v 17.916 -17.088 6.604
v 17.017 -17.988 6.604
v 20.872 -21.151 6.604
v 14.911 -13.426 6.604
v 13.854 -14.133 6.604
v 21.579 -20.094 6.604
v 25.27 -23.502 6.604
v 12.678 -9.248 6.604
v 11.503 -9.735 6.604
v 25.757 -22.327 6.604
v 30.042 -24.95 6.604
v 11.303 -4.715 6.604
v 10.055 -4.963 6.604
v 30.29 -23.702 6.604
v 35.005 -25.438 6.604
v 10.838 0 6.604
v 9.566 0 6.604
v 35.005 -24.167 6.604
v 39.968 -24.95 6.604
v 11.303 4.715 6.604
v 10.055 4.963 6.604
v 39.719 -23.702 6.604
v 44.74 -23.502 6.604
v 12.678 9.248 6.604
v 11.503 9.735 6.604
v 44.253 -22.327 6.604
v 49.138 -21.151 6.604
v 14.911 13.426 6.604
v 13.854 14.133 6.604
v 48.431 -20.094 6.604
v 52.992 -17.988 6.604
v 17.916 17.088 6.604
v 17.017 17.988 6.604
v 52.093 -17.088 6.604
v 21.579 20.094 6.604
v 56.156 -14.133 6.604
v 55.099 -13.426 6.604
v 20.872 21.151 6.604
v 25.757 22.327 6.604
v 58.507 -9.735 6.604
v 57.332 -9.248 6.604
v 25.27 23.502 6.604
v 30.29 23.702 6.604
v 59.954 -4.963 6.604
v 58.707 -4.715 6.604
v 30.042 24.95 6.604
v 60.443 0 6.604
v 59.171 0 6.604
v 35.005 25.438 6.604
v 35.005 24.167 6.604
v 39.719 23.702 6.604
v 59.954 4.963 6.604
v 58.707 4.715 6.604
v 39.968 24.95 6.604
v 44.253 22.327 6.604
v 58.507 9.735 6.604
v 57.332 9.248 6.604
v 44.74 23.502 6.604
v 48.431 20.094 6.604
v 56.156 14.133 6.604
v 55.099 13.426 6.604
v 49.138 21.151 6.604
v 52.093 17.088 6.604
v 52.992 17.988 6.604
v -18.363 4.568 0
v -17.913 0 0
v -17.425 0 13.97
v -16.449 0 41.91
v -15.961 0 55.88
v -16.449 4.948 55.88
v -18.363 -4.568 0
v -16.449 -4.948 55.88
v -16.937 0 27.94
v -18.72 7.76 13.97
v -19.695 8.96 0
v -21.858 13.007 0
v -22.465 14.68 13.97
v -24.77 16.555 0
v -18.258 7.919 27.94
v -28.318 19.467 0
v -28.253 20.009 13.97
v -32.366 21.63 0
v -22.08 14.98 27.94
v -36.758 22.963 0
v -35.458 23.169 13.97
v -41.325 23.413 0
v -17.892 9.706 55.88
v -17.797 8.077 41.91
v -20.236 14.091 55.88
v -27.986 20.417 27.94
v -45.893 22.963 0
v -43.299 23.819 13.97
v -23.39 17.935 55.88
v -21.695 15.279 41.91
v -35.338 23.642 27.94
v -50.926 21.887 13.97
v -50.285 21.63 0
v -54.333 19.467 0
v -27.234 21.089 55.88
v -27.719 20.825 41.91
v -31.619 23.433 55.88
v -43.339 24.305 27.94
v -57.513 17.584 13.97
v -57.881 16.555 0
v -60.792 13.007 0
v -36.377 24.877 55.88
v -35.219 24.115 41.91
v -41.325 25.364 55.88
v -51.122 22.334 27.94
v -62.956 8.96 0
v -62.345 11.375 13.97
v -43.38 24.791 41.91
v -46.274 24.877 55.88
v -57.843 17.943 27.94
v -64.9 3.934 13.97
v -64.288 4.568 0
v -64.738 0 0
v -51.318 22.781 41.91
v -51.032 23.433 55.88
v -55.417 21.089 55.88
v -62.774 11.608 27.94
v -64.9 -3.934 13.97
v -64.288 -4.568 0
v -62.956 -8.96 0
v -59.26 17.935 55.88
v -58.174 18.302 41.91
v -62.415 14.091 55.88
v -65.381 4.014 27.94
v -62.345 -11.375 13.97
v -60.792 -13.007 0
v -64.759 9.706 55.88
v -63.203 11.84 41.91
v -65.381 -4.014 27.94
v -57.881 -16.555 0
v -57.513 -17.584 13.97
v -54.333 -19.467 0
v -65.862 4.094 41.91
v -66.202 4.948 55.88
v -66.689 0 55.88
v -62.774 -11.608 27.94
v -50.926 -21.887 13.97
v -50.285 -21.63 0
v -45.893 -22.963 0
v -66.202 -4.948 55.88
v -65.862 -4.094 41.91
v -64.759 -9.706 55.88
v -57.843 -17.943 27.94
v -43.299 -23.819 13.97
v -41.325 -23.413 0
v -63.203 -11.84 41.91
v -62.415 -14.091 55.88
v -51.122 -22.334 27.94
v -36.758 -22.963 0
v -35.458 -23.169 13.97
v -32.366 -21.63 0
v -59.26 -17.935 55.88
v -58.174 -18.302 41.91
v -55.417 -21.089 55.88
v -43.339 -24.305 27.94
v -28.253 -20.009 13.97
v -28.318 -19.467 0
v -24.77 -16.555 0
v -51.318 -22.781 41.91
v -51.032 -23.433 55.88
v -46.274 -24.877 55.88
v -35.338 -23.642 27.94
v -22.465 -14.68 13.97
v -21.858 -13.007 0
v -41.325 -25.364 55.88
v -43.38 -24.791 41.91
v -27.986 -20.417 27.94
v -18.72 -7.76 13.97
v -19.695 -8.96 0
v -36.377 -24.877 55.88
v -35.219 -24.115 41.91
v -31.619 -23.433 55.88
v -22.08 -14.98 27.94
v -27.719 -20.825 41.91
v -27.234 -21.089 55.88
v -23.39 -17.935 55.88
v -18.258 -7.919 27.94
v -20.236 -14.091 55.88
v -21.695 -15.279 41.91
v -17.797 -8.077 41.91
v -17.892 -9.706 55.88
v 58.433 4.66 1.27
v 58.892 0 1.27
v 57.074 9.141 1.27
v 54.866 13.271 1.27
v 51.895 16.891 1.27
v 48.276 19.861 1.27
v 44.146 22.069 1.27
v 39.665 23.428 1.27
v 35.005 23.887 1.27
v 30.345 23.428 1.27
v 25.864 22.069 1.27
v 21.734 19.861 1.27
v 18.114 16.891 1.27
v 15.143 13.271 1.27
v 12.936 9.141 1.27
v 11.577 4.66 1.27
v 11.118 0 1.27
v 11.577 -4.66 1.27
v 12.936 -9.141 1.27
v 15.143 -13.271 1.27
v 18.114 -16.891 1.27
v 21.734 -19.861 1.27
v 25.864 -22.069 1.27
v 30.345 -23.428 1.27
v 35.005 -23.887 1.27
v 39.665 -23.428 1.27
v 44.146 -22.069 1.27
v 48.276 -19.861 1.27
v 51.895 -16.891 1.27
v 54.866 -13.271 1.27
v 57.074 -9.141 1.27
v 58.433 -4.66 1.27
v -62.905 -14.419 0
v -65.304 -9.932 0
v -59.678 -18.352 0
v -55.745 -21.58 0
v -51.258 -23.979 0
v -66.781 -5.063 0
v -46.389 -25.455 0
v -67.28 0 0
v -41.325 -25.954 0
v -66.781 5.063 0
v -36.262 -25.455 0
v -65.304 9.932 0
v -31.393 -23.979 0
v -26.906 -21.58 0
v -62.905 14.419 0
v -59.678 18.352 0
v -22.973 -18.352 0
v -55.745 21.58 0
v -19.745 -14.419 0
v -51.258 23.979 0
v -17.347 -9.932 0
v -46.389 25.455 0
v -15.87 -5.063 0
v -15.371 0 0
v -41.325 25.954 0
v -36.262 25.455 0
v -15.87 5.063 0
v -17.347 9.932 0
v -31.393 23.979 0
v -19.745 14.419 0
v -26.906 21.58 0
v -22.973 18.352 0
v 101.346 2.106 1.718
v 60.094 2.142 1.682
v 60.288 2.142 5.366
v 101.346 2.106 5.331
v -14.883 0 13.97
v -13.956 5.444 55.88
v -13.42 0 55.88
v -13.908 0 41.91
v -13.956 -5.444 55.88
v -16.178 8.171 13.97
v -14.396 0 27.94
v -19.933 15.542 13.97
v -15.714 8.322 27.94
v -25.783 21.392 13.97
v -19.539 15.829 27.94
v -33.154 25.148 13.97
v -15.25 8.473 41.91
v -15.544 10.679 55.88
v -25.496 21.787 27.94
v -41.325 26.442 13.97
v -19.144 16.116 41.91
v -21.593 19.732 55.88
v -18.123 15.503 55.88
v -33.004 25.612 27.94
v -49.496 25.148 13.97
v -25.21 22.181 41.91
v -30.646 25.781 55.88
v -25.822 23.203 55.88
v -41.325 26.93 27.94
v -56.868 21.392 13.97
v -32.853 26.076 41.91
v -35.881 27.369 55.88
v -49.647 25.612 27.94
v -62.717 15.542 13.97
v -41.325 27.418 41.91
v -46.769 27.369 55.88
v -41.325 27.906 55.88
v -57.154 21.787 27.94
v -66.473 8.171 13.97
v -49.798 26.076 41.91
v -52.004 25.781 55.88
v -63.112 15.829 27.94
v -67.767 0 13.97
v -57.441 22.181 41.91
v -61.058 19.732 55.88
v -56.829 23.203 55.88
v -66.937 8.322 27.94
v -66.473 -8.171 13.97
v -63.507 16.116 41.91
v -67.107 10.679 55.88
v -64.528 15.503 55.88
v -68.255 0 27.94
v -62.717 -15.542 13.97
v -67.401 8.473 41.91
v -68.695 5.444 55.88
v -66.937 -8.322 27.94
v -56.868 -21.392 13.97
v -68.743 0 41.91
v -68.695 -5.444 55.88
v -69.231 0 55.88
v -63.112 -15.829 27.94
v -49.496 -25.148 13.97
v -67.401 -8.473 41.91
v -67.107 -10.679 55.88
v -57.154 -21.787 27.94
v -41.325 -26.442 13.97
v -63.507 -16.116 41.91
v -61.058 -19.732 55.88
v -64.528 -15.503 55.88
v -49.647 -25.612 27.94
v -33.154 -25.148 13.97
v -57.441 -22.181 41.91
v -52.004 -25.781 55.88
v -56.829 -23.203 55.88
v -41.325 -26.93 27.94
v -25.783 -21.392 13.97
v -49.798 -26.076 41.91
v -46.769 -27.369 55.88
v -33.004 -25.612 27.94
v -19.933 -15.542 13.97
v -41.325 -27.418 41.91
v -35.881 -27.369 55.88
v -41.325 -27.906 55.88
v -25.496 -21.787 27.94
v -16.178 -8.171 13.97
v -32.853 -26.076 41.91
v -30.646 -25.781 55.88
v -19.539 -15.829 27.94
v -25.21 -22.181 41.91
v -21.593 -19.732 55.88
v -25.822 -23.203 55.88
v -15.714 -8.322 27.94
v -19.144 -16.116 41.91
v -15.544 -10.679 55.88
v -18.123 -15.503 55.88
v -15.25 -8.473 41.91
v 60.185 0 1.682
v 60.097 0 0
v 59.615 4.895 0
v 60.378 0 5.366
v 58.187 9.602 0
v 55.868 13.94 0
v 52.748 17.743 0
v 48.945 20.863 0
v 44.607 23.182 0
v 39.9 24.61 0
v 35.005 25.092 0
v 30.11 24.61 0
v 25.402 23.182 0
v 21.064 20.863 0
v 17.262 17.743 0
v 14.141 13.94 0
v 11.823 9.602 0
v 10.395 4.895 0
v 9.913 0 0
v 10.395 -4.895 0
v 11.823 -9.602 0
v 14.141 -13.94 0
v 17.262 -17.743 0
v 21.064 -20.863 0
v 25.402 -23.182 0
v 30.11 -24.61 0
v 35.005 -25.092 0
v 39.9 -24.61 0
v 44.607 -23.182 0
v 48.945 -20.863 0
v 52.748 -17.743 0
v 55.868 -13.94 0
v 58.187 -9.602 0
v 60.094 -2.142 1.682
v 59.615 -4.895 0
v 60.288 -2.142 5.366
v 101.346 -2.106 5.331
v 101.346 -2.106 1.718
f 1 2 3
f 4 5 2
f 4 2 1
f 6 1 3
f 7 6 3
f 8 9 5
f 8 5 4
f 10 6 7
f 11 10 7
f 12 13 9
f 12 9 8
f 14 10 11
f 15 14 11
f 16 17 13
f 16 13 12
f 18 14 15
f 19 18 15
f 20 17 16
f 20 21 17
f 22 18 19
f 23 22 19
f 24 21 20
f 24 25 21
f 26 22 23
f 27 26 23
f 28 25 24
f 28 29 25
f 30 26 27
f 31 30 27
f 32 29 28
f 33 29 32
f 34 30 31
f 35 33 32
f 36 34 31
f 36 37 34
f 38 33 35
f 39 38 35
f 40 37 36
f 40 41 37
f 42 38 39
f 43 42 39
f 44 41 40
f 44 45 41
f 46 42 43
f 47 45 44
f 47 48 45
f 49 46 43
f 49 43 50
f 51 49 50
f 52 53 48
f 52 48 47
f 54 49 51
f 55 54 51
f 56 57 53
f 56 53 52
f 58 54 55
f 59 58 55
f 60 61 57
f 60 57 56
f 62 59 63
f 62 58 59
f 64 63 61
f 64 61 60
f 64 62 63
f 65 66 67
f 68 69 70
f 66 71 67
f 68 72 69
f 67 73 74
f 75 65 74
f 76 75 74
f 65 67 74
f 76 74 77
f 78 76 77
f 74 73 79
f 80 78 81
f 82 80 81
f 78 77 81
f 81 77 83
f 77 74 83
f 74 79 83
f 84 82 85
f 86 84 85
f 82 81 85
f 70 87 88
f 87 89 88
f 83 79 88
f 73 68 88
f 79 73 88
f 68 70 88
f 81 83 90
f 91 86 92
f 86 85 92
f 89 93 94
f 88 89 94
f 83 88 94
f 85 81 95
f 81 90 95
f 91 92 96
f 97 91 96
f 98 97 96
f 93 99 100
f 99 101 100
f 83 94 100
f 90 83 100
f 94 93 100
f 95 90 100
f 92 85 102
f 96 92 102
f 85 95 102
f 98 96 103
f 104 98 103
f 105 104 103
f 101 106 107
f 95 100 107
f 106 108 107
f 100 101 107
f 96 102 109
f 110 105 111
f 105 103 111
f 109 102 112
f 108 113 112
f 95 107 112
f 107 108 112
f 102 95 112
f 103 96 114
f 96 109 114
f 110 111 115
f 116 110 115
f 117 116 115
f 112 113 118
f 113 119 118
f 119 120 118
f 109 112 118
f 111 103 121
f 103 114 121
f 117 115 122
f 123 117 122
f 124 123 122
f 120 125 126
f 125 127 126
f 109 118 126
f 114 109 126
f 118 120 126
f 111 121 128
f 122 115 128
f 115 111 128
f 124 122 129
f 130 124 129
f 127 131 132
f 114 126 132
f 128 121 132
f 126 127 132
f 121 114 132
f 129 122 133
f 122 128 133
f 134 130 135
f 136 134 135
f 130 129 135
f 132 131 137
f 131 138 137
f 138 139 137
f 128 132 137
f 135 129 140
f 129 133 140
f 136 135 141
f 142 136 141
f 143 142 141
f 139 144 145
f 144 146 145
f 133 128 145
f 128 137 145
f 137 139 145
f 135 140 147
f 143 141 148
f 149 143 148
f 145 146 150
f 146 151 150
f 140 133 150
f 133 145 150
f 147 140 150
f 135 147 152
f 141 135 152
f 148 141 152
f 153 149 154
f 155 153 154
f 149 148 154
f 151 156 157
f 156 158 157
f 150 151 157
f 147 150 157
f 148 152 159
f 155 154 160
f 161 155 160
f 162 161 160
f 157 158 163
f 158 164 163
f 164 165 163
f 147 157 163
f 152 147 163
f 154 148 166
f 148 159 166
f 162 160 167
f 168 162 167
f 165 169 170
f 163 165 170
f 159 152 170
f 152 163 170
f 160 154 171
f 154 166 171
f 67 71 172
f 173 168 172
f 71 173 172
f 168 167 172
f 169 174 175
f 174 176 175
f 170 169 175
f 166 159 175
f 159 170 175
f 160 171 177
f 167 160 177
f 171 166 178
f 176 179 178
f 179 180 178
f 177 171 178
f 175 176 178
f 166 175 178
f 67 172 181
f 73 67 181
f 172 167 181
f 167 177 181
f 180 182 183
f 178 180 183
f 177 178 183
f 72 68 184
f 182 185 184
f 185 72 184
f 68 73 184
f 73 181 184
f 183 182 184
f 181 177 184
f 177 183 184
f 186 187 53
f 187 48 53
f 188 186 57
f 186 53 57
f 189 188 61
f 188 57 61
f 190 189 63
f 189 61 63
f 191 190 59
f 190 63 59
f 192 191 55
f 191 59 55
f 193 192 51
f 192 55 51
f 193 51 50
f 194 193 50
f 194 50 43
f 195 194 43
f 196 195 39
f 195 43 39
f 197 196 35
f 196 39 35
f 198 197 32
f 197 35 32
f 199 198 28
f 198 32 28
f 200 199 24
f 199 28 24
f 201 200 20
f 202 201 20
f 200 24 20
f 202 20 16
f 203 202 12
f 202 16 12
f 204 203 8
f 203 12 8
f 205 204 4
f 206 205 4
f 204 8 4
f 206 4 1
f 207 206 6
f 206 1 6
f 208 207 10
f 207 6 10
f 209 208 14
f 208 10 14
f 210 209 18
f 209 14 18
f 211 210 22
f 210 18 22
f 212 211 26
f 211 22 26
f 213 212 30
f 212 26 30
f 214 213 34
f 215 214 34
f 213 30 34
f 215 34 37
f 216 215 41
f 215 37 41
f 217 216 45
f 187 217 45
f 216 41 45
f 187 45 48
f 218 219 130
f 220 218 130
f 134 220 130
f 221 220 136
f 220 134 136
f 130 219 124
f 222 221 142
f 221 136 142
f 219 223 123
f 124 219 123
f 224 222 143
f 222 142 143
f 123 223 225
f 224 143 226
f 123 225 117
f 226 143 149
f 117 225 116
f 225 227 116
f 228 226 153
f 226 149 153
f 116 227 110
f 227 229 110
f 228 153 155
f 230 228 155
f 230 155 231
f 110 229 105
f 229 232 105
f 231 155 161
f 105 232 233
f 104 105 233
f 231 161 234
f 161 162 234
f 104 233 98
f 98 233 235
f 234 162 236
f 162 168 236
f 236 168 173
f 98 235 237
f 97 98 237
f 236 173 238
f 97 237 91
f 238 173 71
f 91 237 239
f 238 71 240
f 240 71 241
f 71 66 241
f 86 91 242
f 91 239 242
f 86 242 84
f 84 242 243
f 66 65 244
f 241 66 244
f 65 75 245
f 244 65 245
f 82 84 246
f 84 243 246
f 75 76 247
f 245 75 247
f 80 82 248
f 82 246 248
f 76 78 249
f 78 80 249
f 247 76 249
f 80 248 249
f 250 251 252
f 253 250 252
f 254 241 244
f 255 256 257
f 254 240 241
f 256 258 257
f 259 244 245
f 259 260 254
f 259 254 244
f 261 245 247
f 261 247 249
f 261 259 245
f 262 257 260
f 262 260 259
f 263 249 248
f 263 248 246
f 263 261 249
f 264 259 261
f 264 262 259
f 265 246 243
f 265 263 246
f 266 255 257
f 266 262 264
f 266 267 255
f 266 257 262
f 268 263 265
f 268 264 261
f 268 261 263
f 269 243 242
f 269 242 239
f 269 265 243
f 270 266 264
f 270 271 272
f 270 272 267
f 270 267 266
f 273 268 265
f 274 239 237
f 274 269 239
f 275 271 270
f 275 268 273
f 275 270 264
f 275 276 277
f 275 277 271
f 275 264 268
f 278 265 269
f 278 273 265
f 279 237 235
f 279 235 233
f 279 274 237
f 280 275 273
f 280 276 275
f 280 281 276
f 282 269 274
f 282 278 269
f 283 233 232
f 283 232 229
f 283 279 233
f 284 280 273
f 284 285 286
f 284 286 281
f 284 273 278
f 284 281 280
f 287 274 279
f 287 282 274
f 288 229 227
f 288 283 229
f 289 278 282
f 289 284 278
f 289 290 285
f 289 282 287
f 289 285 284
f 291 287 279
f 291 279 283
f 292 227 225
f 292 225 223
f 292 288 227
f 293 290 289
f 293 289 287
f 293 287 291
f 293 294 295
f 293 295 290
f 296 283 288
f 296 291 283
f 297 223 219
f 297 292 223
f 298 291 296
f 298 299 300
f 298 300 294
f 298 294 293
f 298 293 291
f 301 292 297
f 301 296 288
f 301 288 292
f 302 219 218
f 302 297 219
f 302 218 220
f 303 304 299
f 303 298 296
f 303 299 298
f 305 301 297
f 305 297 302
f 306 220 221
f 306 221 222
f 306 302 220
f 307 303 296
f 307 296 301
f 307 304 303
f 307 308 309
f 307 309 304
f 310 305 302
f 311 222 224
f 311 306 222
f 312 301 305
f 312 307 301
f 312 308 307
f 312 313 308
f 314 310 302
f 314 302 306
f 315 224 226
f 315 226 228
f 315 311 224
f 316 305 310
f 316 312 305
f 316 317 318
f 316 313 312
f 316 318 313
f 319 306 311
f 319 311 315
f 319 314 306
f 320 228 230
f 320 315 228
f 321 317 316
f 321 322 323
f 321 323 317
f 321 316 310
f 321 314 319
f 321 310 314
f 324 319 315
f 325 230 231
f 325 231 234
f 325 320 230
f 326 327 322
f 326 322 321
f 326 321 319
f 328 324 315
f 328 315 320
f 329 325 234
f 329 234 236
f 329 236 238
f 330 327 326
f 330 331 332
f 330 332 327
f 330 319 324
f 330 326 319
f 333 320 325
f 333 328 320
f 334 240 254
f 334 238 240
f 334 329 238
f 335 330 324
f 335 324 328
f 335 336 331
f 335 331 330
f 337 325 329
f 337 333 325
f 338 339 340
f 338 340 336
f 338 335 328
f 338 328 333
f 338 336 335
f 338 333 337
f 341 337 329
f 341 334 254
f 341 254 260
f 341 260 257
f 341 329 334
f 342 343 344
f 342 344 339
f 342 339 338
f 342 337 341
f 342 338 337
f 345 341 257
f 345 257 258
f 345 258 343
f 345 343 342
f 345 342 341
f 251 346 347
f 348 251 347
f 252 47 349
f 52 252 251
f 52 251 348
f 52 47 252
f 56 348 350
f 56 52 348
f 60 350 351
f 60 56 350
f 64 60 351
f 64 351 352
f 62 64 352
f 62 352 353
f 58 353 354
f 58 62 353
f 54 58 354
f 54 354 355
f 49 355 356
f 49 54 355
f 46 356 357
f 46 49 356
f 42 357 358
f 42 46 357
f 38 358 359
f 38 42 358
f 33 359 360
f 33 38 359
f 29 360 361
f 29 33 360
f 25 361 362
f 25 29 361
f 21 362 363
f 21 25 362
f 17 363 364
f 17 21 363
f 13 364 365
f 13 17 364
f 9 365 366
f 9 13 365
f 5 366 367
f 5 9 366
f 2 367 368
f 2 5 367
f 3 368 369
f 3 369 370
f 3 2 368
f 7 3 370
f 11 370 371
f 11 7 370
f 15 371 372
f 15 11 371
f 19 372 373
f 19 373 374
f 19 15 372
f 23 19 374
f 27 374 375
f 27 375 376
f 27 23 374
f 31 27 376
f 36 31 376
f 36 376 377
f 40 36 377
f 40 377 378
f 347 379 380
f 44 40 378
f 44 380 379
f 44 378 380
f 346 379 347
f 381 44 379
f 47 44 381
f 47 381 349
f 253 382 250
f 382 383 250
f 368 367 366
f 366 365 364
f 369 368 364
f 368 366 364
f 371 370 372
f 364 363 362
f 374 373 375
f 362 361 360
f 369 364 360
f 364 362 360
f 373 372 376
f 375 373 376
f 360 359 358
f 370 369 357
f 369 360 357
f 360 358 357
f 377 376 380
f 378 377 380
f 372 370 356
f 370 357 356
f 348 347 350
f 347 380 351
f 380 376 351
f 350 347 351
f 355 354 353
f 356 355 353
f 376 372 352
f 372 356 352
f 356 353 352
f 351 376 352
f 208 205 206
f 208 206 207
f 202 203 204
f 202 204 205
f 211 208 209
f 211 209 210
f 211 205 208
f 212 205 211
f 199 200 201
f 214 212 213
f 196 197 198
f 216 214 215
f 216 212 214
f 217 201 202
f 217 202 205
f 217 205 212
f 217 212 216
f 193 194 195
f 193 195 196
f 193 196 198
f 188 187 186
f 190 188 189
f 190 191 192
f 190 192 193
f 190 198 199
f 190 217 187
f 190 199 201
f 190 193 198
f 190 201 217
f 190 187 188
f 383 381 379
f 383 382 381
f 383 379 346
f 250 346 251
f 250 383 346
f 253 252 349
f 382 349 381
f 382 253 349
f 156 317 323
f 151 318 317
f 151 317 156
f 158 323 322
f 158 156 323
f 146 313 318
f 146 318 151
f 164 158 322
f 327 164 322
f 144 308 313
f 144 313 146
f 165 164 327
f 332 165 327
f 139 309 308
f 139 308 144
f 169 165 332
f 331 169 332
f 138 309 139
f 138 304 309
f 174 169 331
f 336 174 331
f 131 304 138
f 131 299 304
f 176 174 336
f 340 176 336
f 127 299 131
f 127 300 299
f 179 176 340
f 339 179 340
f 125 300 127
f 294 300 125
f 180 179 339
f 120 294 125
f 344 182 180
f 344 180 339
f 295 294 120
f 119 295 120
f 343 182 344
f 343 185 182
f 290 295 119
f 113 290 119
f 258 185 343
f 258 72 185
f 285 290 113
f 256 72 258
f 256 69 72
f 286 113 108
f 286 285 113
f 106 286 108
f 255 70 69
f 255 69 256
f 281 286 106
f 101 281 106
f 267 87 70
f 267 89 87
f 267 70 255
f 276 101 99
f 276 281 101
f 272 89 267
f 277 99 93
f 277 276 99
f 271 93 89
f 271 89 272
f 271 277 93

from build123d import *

# Parameters (mm, degrees)
F0_R     = 25.0921905271
F1_DEPTH = 6.604
F1_TAPER = -3
F2_T     = -1.27
F4_W     = 4.2849979363
F4_H     = 3.6847158335
F5_DEPTH = 41.402
F5_TAPER = 0.05
F6_R     = 25.9541631664
F7_DEPTH = 55.88
F7_TAPER = -2
F8_T     = -2.54


with BuildPart() as f1:
    # F0 (on Top) → F1 (new body)
    with BuildSketch(Plane.XY):
        with Locations((35.0047908723, 0)):
            Circle(F0_R)
    extrude(amount=F1_DEPTH, taper=F1_TAPER)

    # F2
    f2_openings = [f1.faces().sort_by_distance(p)[0] for p in [
        (35.004791, 0, 6.604),
    ]]
    offset(amount=F2_T, openings=f2_openings, kind=Kind.INTERSECTION)

    # F4 (on offset) → F5 (join)
    with BuildSketch(Plane.YZ.offset(59.944)):
        with Locations((0, 3.5243721213)):
            Rectangle(F4_W, F4_H)
    extrude(amount=F5_DEPTH, taper=F5_TAPER)


with BuildPart() as f7:
    # F6 (on Top) → F7 (new body)
    with BuildSketch(Plane.XY):
        with Locations((-41.3253754377, 0)):
            Circle(F6_R)
    extrude(amount=F7_DEPTH, taper=F7_TAPER)

    # F8
    f8_openings = [f7.faces().sort_by_distance(p)[0] for p in [
        (-41.325375, 0, 55.88),
        (-41.325375, 0, 0),
    ]]
    offset(amount=F8_T, openings=f8_openings, kind=Kind.INTERSECTION)


solid = Compound([f1.part, f7.part])
